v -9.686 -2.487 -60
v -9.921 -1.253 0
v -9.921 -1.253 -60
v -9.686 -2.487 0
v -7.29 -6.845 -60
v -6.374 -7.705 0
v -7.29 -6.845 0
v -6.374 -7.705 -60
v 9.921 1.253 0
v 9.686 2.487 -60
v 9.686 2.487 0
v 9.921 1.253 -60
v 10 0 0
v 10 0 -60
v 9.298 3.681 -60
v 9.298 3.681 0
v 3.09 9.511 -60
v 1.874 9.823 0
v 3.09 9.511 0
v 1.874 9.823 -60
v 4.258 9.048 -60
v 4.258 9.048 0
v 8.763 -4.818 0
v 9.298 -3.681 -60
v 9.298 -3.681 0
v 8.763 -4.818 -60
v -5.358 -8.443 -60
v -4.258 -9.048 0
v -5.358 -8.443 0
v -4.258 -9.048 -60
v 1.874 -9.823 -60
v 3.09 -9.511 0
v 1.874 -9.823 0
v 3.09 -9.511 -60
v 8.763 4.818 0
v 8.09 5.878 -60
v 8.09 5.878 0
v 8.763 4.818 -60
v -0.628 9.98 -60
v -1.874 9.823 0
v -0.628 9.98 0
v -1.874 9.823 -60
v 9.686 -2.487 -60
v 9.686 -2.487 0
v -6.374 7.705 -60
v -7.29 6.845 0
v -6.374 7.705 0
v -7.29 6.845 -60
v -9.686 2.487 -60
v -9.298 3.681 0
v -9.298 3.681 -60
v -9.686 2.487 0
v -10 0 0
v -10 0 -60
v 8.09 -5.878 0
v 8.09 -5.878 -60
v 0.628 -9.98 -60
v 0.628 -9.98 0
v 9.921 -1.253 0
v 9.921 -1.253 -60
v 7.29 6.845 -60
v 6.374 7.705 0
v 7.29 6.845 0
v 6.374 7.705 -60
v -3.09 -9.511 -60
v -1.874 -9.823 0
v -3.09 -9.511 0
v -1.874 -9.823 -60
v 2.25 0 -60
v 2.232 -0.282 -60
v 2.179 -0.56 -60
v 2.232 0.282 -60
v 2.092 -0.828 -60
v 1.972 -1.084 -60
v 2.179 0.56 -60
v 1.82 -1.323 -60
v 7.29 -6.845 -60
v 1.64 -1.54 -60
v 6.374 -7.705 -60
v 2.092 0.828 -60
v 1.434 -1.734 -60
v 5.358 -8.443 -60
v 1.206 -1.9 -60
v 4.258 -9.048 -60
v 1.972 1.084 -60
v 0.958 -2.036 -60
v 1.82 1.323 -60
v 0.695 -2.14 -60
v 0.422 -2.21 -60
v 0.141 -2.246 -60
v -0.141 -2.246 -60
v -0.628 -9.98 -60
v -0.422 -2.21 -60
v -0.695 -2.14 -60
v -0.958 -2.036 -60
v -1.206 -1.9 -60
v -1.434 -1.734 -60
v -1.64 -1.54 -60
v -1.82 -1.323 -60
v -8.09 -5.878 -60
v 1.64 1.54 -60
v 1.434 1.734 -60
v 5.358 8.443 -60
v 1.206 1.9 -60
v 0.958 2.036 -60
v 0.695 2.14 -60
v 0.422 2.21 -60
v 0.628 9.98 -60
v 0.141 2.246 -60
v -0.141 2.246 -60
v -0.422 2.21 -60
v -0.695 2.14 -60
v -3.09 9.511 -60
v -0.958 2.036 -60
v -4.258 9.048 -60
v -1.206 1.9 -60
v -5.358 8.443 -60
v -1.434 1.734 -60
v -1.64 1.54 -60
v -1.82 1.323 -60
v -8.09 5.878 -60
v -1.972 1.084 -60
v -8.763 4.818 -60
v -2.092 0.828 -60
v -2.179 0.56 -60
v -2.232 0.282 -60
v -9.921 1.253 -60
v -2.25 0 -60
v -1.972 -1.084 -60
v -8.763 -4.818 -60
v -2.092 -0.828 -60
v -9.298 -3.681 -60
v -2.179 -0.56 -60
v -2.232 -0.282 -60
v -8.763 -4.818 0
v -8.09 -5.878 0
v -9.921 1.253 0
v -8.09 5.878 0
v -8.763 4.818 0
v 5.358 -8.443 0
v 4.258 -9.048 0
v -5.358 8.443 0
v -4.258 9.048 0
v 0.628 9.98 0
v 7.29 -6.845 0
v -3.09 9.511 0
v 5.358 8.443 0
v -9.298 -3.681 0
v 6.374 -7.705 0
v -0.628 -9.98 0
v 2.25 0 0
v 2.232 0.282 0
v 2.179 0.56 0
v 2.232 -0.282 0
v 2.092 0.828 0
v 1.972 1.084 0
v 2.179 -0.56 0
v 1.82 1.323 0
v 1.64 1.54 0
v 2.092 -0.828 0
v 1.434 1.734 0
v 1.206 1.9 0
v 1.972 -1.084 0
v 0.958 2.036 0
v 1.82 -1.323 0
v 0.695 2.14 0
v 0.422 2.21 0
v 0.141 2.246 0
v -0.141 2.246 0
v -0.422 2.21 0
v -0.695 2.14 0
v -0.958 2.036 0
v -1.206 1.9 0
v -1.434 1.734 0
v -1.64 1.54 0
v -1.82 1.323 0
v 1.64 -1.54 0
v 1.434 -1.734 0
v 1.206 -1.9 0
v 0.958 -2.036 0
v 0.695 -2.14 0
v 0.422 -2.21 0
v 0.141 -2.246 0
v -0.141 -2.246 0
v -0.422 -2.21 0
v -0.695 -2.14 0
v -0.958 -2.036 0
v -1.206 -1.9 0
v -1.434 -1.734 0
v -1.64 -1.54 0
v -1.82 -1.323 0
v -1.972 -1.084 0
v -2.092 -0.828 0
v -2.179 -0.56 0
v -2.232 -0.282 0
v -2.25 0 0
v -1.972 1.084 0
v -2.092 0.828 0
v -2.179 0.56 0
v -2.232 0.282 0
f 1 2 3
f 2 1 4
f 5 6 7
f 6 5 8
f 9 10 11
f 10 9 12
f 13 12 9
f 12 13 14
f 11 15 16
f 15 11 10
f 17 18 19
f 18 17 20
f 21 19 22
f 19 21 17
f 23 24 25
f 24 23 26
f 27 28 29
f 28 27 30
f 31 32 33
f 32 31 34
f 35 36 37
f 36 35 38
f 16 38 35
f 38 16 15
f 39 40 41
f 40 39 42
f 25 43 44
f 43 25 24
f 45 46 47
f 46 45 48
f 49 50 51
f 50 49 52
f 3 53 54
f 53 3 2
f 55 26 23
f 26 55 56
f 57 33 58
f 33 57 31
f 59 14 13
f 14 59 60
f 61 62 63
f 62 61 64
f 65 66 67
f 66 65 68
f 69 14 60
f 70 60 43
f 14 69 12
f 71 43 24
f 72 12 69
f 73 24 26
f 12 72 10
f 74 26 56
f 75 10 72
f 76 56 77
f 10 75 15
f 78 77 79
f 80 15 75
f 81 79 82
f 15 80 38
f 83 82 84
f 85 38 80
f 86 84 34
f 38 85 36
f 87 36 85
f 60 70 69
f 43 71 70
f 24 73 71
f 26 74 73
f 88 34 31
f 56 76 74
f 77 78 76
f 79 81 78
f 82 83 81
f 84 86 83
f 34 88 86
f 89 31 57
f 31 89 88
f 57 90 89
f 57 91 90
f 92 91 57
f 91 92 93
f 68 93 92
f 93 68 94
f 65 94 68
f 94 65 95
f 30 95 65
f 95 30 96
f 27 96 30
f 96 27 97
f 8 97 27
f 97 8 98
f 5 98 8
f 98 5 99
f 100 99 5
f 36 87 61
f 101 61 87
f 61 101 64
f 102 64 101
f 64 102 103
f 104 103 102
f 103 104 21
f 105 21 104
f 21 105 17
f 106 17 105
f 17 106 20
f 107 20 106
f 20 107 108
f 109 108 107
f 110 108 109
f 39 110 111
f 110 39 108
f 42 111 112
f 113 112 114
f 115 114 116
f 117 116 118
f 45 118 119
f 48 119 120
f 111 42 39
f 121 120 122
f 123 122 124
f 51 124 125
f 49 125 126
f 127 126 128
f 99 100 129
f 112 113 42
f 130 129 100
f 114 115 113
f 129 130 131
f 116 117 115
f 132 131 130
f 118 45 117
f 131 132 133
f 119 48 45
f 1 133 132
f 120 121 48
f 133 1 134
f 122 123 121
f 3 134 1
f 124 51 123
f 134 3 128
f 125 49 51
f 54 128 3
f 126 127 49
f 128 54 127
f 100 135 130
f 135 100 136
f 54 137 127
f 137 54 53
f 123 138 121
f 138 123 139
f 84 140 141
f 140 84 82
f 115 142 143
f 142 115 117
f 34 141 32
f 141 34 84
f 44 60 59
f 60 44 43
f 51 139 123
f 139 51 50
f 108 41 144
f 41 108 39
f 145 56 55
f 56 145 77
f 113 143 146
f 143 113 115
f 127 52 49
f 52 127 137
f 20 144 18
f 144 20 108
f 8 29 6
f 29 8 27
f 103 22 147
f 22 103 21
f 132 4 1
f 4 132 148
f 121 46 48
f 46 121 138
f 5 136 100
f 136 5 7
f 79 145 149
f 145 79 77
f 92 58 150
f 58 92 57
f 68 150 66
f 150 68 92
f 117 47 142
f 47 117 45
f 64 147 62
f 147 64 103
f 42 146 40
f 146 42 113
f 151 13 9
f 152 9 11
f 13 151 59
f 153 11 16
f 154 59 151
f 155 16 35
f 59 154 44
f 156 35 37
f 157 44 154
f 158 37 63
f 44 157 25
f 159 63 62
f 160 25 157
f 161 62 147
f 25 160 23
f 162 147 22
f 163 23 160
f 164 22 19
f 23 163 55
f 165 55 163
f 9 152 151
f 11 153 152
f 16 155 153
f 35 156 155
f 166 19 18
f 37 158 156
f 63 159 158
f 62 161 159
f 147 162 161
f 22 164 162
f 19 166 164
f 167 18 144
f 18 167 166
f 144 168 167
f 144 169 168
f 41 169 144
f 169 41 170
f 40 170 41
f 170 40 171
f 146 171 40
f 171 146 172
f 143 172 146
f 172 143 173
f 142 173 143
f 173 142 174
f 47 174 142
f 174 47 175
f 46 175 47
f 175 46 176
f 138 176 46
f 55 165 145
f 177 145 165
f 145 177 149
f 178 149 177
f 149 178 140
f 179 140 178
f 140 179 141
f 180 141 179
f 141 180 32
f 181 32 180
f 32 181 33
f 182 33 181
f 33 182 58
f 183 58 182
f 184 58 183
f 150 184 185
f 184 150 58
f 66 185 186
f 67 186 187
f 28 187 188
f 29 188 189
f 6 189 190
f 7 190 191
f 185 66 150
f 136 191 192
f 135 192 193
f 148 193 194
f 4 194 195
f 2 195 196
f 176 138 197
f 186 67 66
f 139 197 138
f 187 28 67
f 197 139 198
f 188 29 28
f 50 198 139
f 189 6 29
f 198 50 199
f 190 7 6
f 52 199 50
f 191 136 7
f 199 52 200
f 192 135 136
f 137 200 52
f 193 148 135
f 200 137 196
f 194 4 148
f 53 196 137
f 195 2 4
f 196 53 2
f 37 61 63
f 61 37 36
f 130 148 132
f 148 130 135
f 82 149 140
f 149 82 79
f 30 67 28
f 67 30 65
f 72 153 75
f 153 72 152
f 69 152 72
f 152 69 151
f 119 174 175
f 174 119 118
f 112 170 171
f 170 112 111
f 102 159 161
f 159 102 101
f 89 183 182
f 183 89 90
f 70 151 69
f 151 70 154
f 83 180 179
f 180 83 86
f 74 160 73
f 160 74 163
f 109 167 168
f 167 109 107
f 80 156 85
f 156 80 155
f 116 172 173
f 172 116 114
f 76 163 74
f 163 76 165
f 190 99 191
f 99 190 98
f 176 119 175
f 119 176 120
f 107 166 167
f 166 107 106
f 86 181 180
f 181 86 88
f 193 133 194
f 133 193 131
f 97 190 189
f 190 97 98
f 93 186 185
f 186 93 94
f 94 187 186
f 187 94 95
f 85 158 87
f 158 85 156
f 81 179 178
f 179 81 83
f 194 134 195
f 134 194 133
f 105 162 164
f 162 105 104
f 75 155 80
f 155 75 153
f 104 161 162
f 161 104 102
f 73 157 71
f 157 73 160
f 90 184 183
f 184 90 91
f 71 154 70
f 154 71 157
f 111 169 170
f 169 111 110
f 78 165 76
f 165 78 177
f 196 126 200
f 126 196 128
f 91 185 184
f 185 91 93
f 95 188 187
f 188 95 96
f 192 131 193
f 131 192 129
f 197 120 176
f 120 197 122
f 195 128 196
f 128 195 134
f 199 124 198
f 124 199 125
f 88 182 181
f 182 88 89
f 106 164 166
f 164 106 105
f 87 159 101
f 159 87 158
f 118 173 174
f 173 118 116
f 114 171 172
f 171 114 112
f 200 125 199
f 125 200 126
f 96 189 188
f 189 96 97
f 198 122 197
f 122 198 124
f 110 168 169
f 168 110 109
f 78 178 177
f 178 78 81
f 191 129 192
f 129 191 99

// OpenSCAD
$fn = 50;


difference() {
	union() {
		translate(v = [0, 0, -60.0000000000]) {
			cylinder(h = 60, r = 10.0000000000);
		}
		cylinder(h = 0, r = 20.0000000000);
	}
	union() {
		#translate(v = [0, 0, -60]) {
			cylinder(h = 60, r = 2.2500000000);
		}
	}
}
